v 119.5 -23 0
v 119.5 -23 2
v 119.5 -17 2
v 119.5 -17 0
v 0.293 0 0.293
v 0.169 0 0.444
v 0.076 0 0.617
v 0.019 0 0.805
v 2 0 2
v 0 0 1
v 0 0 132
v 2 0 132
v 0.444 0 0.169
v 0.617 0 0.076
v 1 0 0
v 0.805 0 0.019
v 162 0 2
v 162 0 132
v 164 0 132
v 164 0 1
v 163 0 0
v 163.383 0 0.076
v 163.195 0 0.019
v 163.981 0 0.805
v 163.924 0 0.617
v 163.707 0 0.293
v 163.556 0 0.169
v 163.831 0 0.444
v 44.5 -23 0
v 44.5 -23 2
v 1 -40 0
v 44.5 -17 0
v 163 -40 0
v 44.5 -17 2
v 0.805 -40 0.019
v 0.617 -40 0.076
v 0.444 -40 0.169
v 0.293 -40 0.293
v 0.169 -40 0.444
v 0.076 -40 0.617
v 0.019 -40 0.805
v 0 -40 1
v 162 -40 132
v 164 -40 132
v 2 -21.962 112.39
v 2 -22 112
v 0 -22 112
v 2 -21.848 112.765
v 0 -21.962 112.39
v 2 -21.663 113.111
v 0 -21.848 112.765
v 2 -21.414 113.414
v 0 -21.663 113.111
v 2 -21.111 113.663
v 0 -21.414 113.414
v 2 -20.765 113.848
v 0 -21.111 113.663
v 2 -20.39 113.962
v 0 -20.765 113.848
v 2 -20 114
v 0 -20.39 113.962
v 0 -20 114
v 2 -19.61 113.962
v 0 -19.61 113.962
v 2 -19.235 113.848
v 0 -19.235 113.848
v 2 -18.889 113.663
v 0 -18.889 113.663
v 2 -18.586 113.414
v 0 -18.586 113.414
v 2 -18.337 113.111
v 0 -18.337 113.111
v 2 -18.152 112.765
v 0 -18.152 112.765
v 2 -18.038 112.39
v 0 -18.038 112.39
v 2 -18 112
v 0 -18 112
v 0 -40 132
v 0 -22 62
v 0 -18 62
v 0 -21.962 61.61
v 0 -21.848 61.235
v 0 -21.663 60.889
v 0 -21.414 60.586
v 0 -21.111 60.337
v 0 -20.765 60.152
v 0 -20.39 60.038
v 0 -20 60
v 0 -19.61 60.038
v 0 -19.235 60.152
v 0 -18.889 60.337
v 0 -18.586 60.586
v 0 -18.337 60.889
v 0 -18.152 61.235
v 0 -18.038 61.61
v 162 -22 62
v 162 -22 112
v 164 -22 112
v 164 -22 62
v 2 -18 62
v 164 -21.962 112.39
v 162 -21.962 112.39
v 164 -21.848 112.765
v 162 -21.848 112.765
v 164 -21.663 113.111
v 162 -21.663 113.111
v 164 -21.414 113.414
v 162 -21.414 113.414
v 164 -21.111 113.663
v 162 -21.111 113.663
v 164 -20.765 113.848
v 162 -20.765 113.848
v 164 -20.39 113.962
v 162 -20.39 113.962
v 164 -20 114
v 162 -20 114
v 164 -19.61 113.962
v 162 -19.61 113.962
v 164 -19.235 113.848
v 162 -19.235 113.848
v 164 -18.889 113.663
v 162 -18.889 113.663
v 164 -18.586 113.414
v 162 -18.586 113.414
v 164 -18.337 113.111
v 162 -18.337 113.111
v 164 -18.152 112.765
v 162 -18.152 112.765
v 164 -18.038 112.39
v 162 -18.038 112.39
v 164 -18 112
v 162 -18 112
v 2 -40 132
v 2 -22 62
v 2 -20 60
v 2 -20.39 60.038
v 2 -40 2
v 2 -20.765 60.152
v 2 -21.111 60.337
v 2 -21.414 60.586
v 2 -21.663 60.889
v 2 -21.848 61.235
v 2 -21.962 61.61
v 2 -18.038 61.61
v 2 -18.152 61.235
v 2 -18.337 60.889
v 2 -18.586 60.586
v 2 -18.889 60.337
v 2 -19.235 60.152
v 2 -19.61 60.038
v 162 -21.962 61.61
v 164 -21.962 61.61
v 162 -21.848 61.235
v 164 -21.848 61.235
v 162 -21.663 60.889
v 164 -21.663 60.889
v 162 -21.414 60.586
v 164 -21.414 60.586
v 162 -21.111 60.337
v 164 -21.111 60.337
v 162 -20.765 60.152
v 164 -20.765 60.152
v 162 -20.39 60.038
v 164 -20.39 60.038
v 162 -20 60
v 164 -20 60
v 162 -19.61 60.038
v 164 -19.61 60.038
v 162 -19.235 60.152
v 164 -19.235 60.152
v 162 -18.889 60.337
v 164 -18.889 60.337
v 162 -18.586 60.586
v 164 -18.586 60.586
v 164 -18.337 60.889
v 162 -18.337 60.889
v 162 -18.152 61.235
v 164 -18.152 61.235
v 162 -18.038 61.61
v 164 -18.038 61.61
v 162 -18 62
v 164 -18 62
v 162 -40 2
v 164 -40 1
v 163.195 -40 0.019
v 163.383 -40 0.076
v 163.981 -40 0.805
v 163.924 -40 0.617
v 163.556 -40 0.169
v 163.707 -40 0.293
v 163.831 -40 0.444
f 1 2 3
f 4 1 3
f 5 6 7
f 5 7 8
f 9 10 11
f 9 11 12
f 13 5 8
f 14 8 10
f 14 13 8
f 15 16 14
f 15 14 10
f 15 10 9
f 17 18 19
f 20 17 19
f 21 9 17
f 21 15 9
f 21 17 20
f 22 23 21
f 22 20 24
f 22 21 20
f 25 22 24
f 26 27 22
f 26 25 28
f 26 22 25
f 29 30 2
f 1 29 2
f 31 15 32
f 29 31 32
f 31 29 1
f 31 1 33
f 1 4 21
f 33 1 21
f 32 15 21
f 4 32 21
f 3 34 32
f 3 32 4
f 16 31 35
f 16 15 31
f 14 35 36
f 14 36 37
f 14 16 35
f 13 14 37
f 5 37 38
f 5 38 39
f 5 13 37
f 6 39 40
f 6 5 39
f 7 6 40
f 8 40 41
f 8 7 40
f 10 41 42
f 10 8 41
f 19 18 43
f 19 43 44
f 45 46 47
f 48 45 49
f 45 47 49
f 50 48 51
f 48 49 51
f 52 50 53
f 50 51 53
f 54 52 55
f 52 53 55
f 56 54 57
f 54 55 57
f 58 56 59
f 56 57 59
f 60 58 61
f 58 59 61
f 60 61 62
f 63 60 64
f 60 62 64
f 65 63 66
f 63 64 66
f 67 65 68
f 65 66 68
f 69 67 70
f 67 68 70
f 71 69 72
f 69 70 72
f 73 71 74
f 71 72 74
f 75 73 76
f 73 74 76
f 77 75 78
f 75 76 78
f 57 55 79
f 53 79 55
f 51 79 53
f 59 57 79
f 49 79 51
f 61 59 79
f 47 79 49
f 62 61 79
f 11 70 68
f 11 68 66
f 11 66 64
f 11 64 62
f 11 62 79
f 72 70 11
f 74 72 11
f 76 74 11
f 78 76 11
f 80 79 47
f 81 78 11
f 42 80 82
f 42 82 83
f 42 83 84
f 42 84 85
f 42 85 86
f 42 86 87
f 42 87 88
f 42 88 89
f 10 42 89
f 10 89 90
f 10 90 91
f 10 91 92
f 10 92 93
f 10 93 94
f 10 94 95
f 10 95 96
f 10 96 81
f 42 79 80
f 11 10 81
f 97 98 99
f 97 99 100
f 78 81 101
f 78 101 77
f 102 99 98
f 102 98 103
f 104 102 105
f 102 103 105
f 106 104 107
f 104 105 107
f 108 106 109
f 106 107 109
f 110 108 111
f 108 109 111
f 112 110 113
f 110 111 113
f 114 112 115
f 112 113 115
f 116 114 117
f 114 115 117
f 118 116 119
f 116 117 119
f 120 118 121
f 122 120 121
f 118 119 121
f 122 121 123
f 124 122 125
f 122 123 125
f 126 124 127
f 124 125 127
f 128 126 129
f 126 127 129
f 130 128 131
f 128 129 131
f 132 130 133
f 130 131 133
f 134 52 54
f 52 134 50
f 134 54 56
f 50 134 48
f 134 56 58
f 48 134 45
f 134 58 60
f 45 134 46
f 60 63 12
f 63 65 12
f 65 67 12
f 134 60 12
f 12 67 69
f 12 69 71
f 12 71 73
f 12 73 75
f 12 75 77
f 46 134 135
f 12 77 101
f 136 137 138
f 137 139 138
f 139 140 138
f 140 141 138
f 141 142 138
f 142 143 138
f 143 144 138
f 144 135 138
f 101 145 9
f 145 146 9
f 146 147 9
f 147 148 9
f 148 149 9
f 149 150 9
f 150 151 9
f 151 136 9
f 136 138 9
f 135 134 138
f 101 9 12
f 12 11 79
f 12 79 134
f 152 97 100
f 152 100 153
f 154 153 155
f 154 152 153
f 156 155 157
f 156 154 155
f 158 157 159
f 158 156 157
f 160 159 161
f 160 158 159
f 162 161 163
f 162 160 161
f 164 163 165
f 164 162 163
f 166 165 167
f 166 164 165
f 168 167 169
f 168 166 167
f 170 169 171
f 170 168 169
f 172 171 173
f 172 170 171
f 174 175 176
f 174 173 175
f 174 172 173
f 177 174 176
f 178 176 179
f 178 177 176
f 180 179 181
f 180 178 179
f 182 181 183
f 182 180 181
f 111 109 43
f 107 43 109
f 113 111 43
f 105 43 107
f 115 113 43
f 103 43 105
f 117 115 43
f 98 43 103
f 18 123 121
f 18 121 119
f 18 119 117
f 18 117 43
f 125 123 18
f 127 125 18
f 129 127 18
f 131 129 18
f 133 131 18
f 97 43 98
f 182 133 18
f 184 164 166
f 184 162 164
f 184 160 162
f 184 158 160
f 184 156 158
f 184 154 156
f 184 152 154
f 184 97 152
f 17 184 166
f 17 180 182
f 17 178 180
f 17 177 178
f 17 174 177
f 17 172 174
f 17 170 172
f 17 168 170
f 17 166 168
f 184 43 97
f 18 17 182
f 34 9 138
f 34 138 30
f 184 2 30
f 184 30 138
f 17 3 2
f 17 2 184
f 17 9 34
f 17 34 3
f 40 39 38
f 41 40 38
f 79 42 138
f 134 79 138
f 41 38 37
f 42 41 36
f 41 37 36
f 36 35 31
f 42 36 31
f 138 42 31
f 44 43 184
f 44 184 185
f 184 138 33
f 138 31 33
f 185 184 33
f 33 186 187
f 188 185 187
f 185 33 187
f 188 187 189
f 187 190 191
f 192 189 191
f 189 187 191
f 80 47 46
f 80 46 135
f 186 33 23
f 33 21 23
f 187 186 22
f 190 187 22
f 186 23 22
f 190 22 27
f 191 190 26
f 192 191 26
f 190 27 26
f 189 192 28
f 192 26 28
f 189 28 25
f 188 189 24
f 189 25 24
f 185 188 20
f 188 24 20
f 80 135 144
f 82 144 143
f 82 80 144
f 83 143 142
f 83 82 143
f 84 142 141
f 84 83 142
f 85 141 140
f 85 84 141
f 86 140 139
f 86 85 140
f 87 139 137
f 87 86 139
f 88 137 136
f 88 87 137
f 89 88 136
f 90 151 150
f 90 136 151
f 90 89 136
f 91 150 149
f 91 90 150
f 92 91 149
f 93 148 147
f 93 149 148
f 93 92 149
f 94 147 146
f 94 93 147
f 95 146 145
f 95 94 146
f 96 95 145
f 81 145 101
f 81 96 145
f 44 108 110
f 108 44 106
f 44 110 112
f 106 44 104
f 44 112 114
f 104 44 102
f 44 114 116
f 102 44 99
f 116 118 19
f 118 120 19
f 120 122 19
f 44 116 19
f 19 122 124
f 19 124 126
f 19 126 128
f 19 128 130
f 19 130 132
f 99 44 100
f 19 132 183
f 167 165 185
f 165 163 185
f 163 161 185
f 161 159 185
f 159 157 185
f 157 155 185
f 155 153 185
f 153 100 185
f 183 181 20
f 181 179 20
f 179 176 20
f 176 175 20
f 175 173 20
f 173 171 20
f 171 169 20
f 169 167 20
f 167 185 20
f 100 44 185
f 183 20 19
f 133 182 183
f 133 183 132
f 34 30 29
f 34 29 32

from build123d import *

# Parameters (mm, degrees)
ESQUISSE1_W             = 164
ESQUISSE1_H             = 40
BOSS_EXTRU_1_DEPTH      = 2
ESQUISSE2_W             = 2
ESQUISSE2_H             = 40
BOSS_EXTRU_2_DEPTH      = 130
ESQUISSE3_W             = 2
ESQUISSE3_H             = 40
BOSS_EXTRU_3_DEPTH      = 130
ESQUISSE4_R             = 2
ENL_V_MAT_EXTRU_1_DEPTH = 165
CONG_1_R                = 1
CONG_2_R                = 1
ESQUISSE5_W             = 75
ESQUISSE5_H             = 6
ENL_V_MAT_EXTRU_2_DEPTH = 130
ENL_V_MAT_EXTRU_3_DEPTH = 165


with BuildPart() as part:
    # Esquisse1 → Boss.-Extru.1 (new body)
    with BuildSketch(Plane.XY):
        with Locations((82, -20)):
            Rectangle(ESQUISSE1_W, ESQUISSE1_H)
    extrude(amount=BOSS_EXTRU_1_DEPTH)

    # Esquisse2 → Boss.-Extru.2 (add)
    with BuildSketch(Plane.XY.offset(2)):
        with Locations((1, -20)):
            Rectangle(ESQUISSE2_W, ESQUISSE2_H)
    extrude(amount=BOSS_EXTRU_2_DEPTH)

    # Esquisse3 → Boss.-Extru.3 (add)
    with BuildSketch(Plane.XY.offset(2)):
        with Locations((163, -20)):
            Rectangle(ESQUISSE3_W, ESQUISSE3_H)
    extrude(amount=BOSS_EXTRU_3_DEPTH)

    # Esquisse4 → Enlèv. mat.-Extru.1 (cut, through all)
    with BuildSketch(Plane.ZY):
        with Locations((112, -20)):
            Circle(ESQUISSE4_R)
    extrude(amount=-ENL_V_MAT_EXTRU_1_DEPTH, mode=Mode.SUBTRACT)

    # Congé1
    cong_1_edges = [part.edges().sort_by_distance(p)[0] for p in [
        (0, -20, 0),
    ]]
    fillet(cong_1_edges, radius=CONG_1_R)

    # Congé2
    cong_2_edges = [part.edges().sort_by_distance(p)[0] for p in [
        (164, -20, 0),
    ]]
    fillet(cong_2_edges, radius=CONG_2_R)

    # Esquisse5 → Enlèv. mat.-Extru.2 (cut)
    with BuildSketch(Plane.XY.offset(2)):
        with Locations((82, -20)):
            Rectangle(ESQUISSE5_W, ESQUISSE5_H)
    extrude(amount=-ENL_V_MAT_EXTRU_2_DEPTH, mode=Mode.SUBTRACT)

    # Esquisse6 → Enlèv. mat.-Extru.3 (cut, through all)
    with BuildSketch(Plane.ZY):
        with BuildLine():
            Line((62, -18), (112, -18))
            ThreePointArc((112, -18), (114, -20), (112, -22))
            Line((112, -22), (62, -22))
            ThreePointArc((62, -22), (60, -20), (62, -18))
        make_face()
    extrude(amount=-ENL_V_MAT_EXTRU_3_DEPTH, mode=Mode.SUBTRACT)


solid = part.part
